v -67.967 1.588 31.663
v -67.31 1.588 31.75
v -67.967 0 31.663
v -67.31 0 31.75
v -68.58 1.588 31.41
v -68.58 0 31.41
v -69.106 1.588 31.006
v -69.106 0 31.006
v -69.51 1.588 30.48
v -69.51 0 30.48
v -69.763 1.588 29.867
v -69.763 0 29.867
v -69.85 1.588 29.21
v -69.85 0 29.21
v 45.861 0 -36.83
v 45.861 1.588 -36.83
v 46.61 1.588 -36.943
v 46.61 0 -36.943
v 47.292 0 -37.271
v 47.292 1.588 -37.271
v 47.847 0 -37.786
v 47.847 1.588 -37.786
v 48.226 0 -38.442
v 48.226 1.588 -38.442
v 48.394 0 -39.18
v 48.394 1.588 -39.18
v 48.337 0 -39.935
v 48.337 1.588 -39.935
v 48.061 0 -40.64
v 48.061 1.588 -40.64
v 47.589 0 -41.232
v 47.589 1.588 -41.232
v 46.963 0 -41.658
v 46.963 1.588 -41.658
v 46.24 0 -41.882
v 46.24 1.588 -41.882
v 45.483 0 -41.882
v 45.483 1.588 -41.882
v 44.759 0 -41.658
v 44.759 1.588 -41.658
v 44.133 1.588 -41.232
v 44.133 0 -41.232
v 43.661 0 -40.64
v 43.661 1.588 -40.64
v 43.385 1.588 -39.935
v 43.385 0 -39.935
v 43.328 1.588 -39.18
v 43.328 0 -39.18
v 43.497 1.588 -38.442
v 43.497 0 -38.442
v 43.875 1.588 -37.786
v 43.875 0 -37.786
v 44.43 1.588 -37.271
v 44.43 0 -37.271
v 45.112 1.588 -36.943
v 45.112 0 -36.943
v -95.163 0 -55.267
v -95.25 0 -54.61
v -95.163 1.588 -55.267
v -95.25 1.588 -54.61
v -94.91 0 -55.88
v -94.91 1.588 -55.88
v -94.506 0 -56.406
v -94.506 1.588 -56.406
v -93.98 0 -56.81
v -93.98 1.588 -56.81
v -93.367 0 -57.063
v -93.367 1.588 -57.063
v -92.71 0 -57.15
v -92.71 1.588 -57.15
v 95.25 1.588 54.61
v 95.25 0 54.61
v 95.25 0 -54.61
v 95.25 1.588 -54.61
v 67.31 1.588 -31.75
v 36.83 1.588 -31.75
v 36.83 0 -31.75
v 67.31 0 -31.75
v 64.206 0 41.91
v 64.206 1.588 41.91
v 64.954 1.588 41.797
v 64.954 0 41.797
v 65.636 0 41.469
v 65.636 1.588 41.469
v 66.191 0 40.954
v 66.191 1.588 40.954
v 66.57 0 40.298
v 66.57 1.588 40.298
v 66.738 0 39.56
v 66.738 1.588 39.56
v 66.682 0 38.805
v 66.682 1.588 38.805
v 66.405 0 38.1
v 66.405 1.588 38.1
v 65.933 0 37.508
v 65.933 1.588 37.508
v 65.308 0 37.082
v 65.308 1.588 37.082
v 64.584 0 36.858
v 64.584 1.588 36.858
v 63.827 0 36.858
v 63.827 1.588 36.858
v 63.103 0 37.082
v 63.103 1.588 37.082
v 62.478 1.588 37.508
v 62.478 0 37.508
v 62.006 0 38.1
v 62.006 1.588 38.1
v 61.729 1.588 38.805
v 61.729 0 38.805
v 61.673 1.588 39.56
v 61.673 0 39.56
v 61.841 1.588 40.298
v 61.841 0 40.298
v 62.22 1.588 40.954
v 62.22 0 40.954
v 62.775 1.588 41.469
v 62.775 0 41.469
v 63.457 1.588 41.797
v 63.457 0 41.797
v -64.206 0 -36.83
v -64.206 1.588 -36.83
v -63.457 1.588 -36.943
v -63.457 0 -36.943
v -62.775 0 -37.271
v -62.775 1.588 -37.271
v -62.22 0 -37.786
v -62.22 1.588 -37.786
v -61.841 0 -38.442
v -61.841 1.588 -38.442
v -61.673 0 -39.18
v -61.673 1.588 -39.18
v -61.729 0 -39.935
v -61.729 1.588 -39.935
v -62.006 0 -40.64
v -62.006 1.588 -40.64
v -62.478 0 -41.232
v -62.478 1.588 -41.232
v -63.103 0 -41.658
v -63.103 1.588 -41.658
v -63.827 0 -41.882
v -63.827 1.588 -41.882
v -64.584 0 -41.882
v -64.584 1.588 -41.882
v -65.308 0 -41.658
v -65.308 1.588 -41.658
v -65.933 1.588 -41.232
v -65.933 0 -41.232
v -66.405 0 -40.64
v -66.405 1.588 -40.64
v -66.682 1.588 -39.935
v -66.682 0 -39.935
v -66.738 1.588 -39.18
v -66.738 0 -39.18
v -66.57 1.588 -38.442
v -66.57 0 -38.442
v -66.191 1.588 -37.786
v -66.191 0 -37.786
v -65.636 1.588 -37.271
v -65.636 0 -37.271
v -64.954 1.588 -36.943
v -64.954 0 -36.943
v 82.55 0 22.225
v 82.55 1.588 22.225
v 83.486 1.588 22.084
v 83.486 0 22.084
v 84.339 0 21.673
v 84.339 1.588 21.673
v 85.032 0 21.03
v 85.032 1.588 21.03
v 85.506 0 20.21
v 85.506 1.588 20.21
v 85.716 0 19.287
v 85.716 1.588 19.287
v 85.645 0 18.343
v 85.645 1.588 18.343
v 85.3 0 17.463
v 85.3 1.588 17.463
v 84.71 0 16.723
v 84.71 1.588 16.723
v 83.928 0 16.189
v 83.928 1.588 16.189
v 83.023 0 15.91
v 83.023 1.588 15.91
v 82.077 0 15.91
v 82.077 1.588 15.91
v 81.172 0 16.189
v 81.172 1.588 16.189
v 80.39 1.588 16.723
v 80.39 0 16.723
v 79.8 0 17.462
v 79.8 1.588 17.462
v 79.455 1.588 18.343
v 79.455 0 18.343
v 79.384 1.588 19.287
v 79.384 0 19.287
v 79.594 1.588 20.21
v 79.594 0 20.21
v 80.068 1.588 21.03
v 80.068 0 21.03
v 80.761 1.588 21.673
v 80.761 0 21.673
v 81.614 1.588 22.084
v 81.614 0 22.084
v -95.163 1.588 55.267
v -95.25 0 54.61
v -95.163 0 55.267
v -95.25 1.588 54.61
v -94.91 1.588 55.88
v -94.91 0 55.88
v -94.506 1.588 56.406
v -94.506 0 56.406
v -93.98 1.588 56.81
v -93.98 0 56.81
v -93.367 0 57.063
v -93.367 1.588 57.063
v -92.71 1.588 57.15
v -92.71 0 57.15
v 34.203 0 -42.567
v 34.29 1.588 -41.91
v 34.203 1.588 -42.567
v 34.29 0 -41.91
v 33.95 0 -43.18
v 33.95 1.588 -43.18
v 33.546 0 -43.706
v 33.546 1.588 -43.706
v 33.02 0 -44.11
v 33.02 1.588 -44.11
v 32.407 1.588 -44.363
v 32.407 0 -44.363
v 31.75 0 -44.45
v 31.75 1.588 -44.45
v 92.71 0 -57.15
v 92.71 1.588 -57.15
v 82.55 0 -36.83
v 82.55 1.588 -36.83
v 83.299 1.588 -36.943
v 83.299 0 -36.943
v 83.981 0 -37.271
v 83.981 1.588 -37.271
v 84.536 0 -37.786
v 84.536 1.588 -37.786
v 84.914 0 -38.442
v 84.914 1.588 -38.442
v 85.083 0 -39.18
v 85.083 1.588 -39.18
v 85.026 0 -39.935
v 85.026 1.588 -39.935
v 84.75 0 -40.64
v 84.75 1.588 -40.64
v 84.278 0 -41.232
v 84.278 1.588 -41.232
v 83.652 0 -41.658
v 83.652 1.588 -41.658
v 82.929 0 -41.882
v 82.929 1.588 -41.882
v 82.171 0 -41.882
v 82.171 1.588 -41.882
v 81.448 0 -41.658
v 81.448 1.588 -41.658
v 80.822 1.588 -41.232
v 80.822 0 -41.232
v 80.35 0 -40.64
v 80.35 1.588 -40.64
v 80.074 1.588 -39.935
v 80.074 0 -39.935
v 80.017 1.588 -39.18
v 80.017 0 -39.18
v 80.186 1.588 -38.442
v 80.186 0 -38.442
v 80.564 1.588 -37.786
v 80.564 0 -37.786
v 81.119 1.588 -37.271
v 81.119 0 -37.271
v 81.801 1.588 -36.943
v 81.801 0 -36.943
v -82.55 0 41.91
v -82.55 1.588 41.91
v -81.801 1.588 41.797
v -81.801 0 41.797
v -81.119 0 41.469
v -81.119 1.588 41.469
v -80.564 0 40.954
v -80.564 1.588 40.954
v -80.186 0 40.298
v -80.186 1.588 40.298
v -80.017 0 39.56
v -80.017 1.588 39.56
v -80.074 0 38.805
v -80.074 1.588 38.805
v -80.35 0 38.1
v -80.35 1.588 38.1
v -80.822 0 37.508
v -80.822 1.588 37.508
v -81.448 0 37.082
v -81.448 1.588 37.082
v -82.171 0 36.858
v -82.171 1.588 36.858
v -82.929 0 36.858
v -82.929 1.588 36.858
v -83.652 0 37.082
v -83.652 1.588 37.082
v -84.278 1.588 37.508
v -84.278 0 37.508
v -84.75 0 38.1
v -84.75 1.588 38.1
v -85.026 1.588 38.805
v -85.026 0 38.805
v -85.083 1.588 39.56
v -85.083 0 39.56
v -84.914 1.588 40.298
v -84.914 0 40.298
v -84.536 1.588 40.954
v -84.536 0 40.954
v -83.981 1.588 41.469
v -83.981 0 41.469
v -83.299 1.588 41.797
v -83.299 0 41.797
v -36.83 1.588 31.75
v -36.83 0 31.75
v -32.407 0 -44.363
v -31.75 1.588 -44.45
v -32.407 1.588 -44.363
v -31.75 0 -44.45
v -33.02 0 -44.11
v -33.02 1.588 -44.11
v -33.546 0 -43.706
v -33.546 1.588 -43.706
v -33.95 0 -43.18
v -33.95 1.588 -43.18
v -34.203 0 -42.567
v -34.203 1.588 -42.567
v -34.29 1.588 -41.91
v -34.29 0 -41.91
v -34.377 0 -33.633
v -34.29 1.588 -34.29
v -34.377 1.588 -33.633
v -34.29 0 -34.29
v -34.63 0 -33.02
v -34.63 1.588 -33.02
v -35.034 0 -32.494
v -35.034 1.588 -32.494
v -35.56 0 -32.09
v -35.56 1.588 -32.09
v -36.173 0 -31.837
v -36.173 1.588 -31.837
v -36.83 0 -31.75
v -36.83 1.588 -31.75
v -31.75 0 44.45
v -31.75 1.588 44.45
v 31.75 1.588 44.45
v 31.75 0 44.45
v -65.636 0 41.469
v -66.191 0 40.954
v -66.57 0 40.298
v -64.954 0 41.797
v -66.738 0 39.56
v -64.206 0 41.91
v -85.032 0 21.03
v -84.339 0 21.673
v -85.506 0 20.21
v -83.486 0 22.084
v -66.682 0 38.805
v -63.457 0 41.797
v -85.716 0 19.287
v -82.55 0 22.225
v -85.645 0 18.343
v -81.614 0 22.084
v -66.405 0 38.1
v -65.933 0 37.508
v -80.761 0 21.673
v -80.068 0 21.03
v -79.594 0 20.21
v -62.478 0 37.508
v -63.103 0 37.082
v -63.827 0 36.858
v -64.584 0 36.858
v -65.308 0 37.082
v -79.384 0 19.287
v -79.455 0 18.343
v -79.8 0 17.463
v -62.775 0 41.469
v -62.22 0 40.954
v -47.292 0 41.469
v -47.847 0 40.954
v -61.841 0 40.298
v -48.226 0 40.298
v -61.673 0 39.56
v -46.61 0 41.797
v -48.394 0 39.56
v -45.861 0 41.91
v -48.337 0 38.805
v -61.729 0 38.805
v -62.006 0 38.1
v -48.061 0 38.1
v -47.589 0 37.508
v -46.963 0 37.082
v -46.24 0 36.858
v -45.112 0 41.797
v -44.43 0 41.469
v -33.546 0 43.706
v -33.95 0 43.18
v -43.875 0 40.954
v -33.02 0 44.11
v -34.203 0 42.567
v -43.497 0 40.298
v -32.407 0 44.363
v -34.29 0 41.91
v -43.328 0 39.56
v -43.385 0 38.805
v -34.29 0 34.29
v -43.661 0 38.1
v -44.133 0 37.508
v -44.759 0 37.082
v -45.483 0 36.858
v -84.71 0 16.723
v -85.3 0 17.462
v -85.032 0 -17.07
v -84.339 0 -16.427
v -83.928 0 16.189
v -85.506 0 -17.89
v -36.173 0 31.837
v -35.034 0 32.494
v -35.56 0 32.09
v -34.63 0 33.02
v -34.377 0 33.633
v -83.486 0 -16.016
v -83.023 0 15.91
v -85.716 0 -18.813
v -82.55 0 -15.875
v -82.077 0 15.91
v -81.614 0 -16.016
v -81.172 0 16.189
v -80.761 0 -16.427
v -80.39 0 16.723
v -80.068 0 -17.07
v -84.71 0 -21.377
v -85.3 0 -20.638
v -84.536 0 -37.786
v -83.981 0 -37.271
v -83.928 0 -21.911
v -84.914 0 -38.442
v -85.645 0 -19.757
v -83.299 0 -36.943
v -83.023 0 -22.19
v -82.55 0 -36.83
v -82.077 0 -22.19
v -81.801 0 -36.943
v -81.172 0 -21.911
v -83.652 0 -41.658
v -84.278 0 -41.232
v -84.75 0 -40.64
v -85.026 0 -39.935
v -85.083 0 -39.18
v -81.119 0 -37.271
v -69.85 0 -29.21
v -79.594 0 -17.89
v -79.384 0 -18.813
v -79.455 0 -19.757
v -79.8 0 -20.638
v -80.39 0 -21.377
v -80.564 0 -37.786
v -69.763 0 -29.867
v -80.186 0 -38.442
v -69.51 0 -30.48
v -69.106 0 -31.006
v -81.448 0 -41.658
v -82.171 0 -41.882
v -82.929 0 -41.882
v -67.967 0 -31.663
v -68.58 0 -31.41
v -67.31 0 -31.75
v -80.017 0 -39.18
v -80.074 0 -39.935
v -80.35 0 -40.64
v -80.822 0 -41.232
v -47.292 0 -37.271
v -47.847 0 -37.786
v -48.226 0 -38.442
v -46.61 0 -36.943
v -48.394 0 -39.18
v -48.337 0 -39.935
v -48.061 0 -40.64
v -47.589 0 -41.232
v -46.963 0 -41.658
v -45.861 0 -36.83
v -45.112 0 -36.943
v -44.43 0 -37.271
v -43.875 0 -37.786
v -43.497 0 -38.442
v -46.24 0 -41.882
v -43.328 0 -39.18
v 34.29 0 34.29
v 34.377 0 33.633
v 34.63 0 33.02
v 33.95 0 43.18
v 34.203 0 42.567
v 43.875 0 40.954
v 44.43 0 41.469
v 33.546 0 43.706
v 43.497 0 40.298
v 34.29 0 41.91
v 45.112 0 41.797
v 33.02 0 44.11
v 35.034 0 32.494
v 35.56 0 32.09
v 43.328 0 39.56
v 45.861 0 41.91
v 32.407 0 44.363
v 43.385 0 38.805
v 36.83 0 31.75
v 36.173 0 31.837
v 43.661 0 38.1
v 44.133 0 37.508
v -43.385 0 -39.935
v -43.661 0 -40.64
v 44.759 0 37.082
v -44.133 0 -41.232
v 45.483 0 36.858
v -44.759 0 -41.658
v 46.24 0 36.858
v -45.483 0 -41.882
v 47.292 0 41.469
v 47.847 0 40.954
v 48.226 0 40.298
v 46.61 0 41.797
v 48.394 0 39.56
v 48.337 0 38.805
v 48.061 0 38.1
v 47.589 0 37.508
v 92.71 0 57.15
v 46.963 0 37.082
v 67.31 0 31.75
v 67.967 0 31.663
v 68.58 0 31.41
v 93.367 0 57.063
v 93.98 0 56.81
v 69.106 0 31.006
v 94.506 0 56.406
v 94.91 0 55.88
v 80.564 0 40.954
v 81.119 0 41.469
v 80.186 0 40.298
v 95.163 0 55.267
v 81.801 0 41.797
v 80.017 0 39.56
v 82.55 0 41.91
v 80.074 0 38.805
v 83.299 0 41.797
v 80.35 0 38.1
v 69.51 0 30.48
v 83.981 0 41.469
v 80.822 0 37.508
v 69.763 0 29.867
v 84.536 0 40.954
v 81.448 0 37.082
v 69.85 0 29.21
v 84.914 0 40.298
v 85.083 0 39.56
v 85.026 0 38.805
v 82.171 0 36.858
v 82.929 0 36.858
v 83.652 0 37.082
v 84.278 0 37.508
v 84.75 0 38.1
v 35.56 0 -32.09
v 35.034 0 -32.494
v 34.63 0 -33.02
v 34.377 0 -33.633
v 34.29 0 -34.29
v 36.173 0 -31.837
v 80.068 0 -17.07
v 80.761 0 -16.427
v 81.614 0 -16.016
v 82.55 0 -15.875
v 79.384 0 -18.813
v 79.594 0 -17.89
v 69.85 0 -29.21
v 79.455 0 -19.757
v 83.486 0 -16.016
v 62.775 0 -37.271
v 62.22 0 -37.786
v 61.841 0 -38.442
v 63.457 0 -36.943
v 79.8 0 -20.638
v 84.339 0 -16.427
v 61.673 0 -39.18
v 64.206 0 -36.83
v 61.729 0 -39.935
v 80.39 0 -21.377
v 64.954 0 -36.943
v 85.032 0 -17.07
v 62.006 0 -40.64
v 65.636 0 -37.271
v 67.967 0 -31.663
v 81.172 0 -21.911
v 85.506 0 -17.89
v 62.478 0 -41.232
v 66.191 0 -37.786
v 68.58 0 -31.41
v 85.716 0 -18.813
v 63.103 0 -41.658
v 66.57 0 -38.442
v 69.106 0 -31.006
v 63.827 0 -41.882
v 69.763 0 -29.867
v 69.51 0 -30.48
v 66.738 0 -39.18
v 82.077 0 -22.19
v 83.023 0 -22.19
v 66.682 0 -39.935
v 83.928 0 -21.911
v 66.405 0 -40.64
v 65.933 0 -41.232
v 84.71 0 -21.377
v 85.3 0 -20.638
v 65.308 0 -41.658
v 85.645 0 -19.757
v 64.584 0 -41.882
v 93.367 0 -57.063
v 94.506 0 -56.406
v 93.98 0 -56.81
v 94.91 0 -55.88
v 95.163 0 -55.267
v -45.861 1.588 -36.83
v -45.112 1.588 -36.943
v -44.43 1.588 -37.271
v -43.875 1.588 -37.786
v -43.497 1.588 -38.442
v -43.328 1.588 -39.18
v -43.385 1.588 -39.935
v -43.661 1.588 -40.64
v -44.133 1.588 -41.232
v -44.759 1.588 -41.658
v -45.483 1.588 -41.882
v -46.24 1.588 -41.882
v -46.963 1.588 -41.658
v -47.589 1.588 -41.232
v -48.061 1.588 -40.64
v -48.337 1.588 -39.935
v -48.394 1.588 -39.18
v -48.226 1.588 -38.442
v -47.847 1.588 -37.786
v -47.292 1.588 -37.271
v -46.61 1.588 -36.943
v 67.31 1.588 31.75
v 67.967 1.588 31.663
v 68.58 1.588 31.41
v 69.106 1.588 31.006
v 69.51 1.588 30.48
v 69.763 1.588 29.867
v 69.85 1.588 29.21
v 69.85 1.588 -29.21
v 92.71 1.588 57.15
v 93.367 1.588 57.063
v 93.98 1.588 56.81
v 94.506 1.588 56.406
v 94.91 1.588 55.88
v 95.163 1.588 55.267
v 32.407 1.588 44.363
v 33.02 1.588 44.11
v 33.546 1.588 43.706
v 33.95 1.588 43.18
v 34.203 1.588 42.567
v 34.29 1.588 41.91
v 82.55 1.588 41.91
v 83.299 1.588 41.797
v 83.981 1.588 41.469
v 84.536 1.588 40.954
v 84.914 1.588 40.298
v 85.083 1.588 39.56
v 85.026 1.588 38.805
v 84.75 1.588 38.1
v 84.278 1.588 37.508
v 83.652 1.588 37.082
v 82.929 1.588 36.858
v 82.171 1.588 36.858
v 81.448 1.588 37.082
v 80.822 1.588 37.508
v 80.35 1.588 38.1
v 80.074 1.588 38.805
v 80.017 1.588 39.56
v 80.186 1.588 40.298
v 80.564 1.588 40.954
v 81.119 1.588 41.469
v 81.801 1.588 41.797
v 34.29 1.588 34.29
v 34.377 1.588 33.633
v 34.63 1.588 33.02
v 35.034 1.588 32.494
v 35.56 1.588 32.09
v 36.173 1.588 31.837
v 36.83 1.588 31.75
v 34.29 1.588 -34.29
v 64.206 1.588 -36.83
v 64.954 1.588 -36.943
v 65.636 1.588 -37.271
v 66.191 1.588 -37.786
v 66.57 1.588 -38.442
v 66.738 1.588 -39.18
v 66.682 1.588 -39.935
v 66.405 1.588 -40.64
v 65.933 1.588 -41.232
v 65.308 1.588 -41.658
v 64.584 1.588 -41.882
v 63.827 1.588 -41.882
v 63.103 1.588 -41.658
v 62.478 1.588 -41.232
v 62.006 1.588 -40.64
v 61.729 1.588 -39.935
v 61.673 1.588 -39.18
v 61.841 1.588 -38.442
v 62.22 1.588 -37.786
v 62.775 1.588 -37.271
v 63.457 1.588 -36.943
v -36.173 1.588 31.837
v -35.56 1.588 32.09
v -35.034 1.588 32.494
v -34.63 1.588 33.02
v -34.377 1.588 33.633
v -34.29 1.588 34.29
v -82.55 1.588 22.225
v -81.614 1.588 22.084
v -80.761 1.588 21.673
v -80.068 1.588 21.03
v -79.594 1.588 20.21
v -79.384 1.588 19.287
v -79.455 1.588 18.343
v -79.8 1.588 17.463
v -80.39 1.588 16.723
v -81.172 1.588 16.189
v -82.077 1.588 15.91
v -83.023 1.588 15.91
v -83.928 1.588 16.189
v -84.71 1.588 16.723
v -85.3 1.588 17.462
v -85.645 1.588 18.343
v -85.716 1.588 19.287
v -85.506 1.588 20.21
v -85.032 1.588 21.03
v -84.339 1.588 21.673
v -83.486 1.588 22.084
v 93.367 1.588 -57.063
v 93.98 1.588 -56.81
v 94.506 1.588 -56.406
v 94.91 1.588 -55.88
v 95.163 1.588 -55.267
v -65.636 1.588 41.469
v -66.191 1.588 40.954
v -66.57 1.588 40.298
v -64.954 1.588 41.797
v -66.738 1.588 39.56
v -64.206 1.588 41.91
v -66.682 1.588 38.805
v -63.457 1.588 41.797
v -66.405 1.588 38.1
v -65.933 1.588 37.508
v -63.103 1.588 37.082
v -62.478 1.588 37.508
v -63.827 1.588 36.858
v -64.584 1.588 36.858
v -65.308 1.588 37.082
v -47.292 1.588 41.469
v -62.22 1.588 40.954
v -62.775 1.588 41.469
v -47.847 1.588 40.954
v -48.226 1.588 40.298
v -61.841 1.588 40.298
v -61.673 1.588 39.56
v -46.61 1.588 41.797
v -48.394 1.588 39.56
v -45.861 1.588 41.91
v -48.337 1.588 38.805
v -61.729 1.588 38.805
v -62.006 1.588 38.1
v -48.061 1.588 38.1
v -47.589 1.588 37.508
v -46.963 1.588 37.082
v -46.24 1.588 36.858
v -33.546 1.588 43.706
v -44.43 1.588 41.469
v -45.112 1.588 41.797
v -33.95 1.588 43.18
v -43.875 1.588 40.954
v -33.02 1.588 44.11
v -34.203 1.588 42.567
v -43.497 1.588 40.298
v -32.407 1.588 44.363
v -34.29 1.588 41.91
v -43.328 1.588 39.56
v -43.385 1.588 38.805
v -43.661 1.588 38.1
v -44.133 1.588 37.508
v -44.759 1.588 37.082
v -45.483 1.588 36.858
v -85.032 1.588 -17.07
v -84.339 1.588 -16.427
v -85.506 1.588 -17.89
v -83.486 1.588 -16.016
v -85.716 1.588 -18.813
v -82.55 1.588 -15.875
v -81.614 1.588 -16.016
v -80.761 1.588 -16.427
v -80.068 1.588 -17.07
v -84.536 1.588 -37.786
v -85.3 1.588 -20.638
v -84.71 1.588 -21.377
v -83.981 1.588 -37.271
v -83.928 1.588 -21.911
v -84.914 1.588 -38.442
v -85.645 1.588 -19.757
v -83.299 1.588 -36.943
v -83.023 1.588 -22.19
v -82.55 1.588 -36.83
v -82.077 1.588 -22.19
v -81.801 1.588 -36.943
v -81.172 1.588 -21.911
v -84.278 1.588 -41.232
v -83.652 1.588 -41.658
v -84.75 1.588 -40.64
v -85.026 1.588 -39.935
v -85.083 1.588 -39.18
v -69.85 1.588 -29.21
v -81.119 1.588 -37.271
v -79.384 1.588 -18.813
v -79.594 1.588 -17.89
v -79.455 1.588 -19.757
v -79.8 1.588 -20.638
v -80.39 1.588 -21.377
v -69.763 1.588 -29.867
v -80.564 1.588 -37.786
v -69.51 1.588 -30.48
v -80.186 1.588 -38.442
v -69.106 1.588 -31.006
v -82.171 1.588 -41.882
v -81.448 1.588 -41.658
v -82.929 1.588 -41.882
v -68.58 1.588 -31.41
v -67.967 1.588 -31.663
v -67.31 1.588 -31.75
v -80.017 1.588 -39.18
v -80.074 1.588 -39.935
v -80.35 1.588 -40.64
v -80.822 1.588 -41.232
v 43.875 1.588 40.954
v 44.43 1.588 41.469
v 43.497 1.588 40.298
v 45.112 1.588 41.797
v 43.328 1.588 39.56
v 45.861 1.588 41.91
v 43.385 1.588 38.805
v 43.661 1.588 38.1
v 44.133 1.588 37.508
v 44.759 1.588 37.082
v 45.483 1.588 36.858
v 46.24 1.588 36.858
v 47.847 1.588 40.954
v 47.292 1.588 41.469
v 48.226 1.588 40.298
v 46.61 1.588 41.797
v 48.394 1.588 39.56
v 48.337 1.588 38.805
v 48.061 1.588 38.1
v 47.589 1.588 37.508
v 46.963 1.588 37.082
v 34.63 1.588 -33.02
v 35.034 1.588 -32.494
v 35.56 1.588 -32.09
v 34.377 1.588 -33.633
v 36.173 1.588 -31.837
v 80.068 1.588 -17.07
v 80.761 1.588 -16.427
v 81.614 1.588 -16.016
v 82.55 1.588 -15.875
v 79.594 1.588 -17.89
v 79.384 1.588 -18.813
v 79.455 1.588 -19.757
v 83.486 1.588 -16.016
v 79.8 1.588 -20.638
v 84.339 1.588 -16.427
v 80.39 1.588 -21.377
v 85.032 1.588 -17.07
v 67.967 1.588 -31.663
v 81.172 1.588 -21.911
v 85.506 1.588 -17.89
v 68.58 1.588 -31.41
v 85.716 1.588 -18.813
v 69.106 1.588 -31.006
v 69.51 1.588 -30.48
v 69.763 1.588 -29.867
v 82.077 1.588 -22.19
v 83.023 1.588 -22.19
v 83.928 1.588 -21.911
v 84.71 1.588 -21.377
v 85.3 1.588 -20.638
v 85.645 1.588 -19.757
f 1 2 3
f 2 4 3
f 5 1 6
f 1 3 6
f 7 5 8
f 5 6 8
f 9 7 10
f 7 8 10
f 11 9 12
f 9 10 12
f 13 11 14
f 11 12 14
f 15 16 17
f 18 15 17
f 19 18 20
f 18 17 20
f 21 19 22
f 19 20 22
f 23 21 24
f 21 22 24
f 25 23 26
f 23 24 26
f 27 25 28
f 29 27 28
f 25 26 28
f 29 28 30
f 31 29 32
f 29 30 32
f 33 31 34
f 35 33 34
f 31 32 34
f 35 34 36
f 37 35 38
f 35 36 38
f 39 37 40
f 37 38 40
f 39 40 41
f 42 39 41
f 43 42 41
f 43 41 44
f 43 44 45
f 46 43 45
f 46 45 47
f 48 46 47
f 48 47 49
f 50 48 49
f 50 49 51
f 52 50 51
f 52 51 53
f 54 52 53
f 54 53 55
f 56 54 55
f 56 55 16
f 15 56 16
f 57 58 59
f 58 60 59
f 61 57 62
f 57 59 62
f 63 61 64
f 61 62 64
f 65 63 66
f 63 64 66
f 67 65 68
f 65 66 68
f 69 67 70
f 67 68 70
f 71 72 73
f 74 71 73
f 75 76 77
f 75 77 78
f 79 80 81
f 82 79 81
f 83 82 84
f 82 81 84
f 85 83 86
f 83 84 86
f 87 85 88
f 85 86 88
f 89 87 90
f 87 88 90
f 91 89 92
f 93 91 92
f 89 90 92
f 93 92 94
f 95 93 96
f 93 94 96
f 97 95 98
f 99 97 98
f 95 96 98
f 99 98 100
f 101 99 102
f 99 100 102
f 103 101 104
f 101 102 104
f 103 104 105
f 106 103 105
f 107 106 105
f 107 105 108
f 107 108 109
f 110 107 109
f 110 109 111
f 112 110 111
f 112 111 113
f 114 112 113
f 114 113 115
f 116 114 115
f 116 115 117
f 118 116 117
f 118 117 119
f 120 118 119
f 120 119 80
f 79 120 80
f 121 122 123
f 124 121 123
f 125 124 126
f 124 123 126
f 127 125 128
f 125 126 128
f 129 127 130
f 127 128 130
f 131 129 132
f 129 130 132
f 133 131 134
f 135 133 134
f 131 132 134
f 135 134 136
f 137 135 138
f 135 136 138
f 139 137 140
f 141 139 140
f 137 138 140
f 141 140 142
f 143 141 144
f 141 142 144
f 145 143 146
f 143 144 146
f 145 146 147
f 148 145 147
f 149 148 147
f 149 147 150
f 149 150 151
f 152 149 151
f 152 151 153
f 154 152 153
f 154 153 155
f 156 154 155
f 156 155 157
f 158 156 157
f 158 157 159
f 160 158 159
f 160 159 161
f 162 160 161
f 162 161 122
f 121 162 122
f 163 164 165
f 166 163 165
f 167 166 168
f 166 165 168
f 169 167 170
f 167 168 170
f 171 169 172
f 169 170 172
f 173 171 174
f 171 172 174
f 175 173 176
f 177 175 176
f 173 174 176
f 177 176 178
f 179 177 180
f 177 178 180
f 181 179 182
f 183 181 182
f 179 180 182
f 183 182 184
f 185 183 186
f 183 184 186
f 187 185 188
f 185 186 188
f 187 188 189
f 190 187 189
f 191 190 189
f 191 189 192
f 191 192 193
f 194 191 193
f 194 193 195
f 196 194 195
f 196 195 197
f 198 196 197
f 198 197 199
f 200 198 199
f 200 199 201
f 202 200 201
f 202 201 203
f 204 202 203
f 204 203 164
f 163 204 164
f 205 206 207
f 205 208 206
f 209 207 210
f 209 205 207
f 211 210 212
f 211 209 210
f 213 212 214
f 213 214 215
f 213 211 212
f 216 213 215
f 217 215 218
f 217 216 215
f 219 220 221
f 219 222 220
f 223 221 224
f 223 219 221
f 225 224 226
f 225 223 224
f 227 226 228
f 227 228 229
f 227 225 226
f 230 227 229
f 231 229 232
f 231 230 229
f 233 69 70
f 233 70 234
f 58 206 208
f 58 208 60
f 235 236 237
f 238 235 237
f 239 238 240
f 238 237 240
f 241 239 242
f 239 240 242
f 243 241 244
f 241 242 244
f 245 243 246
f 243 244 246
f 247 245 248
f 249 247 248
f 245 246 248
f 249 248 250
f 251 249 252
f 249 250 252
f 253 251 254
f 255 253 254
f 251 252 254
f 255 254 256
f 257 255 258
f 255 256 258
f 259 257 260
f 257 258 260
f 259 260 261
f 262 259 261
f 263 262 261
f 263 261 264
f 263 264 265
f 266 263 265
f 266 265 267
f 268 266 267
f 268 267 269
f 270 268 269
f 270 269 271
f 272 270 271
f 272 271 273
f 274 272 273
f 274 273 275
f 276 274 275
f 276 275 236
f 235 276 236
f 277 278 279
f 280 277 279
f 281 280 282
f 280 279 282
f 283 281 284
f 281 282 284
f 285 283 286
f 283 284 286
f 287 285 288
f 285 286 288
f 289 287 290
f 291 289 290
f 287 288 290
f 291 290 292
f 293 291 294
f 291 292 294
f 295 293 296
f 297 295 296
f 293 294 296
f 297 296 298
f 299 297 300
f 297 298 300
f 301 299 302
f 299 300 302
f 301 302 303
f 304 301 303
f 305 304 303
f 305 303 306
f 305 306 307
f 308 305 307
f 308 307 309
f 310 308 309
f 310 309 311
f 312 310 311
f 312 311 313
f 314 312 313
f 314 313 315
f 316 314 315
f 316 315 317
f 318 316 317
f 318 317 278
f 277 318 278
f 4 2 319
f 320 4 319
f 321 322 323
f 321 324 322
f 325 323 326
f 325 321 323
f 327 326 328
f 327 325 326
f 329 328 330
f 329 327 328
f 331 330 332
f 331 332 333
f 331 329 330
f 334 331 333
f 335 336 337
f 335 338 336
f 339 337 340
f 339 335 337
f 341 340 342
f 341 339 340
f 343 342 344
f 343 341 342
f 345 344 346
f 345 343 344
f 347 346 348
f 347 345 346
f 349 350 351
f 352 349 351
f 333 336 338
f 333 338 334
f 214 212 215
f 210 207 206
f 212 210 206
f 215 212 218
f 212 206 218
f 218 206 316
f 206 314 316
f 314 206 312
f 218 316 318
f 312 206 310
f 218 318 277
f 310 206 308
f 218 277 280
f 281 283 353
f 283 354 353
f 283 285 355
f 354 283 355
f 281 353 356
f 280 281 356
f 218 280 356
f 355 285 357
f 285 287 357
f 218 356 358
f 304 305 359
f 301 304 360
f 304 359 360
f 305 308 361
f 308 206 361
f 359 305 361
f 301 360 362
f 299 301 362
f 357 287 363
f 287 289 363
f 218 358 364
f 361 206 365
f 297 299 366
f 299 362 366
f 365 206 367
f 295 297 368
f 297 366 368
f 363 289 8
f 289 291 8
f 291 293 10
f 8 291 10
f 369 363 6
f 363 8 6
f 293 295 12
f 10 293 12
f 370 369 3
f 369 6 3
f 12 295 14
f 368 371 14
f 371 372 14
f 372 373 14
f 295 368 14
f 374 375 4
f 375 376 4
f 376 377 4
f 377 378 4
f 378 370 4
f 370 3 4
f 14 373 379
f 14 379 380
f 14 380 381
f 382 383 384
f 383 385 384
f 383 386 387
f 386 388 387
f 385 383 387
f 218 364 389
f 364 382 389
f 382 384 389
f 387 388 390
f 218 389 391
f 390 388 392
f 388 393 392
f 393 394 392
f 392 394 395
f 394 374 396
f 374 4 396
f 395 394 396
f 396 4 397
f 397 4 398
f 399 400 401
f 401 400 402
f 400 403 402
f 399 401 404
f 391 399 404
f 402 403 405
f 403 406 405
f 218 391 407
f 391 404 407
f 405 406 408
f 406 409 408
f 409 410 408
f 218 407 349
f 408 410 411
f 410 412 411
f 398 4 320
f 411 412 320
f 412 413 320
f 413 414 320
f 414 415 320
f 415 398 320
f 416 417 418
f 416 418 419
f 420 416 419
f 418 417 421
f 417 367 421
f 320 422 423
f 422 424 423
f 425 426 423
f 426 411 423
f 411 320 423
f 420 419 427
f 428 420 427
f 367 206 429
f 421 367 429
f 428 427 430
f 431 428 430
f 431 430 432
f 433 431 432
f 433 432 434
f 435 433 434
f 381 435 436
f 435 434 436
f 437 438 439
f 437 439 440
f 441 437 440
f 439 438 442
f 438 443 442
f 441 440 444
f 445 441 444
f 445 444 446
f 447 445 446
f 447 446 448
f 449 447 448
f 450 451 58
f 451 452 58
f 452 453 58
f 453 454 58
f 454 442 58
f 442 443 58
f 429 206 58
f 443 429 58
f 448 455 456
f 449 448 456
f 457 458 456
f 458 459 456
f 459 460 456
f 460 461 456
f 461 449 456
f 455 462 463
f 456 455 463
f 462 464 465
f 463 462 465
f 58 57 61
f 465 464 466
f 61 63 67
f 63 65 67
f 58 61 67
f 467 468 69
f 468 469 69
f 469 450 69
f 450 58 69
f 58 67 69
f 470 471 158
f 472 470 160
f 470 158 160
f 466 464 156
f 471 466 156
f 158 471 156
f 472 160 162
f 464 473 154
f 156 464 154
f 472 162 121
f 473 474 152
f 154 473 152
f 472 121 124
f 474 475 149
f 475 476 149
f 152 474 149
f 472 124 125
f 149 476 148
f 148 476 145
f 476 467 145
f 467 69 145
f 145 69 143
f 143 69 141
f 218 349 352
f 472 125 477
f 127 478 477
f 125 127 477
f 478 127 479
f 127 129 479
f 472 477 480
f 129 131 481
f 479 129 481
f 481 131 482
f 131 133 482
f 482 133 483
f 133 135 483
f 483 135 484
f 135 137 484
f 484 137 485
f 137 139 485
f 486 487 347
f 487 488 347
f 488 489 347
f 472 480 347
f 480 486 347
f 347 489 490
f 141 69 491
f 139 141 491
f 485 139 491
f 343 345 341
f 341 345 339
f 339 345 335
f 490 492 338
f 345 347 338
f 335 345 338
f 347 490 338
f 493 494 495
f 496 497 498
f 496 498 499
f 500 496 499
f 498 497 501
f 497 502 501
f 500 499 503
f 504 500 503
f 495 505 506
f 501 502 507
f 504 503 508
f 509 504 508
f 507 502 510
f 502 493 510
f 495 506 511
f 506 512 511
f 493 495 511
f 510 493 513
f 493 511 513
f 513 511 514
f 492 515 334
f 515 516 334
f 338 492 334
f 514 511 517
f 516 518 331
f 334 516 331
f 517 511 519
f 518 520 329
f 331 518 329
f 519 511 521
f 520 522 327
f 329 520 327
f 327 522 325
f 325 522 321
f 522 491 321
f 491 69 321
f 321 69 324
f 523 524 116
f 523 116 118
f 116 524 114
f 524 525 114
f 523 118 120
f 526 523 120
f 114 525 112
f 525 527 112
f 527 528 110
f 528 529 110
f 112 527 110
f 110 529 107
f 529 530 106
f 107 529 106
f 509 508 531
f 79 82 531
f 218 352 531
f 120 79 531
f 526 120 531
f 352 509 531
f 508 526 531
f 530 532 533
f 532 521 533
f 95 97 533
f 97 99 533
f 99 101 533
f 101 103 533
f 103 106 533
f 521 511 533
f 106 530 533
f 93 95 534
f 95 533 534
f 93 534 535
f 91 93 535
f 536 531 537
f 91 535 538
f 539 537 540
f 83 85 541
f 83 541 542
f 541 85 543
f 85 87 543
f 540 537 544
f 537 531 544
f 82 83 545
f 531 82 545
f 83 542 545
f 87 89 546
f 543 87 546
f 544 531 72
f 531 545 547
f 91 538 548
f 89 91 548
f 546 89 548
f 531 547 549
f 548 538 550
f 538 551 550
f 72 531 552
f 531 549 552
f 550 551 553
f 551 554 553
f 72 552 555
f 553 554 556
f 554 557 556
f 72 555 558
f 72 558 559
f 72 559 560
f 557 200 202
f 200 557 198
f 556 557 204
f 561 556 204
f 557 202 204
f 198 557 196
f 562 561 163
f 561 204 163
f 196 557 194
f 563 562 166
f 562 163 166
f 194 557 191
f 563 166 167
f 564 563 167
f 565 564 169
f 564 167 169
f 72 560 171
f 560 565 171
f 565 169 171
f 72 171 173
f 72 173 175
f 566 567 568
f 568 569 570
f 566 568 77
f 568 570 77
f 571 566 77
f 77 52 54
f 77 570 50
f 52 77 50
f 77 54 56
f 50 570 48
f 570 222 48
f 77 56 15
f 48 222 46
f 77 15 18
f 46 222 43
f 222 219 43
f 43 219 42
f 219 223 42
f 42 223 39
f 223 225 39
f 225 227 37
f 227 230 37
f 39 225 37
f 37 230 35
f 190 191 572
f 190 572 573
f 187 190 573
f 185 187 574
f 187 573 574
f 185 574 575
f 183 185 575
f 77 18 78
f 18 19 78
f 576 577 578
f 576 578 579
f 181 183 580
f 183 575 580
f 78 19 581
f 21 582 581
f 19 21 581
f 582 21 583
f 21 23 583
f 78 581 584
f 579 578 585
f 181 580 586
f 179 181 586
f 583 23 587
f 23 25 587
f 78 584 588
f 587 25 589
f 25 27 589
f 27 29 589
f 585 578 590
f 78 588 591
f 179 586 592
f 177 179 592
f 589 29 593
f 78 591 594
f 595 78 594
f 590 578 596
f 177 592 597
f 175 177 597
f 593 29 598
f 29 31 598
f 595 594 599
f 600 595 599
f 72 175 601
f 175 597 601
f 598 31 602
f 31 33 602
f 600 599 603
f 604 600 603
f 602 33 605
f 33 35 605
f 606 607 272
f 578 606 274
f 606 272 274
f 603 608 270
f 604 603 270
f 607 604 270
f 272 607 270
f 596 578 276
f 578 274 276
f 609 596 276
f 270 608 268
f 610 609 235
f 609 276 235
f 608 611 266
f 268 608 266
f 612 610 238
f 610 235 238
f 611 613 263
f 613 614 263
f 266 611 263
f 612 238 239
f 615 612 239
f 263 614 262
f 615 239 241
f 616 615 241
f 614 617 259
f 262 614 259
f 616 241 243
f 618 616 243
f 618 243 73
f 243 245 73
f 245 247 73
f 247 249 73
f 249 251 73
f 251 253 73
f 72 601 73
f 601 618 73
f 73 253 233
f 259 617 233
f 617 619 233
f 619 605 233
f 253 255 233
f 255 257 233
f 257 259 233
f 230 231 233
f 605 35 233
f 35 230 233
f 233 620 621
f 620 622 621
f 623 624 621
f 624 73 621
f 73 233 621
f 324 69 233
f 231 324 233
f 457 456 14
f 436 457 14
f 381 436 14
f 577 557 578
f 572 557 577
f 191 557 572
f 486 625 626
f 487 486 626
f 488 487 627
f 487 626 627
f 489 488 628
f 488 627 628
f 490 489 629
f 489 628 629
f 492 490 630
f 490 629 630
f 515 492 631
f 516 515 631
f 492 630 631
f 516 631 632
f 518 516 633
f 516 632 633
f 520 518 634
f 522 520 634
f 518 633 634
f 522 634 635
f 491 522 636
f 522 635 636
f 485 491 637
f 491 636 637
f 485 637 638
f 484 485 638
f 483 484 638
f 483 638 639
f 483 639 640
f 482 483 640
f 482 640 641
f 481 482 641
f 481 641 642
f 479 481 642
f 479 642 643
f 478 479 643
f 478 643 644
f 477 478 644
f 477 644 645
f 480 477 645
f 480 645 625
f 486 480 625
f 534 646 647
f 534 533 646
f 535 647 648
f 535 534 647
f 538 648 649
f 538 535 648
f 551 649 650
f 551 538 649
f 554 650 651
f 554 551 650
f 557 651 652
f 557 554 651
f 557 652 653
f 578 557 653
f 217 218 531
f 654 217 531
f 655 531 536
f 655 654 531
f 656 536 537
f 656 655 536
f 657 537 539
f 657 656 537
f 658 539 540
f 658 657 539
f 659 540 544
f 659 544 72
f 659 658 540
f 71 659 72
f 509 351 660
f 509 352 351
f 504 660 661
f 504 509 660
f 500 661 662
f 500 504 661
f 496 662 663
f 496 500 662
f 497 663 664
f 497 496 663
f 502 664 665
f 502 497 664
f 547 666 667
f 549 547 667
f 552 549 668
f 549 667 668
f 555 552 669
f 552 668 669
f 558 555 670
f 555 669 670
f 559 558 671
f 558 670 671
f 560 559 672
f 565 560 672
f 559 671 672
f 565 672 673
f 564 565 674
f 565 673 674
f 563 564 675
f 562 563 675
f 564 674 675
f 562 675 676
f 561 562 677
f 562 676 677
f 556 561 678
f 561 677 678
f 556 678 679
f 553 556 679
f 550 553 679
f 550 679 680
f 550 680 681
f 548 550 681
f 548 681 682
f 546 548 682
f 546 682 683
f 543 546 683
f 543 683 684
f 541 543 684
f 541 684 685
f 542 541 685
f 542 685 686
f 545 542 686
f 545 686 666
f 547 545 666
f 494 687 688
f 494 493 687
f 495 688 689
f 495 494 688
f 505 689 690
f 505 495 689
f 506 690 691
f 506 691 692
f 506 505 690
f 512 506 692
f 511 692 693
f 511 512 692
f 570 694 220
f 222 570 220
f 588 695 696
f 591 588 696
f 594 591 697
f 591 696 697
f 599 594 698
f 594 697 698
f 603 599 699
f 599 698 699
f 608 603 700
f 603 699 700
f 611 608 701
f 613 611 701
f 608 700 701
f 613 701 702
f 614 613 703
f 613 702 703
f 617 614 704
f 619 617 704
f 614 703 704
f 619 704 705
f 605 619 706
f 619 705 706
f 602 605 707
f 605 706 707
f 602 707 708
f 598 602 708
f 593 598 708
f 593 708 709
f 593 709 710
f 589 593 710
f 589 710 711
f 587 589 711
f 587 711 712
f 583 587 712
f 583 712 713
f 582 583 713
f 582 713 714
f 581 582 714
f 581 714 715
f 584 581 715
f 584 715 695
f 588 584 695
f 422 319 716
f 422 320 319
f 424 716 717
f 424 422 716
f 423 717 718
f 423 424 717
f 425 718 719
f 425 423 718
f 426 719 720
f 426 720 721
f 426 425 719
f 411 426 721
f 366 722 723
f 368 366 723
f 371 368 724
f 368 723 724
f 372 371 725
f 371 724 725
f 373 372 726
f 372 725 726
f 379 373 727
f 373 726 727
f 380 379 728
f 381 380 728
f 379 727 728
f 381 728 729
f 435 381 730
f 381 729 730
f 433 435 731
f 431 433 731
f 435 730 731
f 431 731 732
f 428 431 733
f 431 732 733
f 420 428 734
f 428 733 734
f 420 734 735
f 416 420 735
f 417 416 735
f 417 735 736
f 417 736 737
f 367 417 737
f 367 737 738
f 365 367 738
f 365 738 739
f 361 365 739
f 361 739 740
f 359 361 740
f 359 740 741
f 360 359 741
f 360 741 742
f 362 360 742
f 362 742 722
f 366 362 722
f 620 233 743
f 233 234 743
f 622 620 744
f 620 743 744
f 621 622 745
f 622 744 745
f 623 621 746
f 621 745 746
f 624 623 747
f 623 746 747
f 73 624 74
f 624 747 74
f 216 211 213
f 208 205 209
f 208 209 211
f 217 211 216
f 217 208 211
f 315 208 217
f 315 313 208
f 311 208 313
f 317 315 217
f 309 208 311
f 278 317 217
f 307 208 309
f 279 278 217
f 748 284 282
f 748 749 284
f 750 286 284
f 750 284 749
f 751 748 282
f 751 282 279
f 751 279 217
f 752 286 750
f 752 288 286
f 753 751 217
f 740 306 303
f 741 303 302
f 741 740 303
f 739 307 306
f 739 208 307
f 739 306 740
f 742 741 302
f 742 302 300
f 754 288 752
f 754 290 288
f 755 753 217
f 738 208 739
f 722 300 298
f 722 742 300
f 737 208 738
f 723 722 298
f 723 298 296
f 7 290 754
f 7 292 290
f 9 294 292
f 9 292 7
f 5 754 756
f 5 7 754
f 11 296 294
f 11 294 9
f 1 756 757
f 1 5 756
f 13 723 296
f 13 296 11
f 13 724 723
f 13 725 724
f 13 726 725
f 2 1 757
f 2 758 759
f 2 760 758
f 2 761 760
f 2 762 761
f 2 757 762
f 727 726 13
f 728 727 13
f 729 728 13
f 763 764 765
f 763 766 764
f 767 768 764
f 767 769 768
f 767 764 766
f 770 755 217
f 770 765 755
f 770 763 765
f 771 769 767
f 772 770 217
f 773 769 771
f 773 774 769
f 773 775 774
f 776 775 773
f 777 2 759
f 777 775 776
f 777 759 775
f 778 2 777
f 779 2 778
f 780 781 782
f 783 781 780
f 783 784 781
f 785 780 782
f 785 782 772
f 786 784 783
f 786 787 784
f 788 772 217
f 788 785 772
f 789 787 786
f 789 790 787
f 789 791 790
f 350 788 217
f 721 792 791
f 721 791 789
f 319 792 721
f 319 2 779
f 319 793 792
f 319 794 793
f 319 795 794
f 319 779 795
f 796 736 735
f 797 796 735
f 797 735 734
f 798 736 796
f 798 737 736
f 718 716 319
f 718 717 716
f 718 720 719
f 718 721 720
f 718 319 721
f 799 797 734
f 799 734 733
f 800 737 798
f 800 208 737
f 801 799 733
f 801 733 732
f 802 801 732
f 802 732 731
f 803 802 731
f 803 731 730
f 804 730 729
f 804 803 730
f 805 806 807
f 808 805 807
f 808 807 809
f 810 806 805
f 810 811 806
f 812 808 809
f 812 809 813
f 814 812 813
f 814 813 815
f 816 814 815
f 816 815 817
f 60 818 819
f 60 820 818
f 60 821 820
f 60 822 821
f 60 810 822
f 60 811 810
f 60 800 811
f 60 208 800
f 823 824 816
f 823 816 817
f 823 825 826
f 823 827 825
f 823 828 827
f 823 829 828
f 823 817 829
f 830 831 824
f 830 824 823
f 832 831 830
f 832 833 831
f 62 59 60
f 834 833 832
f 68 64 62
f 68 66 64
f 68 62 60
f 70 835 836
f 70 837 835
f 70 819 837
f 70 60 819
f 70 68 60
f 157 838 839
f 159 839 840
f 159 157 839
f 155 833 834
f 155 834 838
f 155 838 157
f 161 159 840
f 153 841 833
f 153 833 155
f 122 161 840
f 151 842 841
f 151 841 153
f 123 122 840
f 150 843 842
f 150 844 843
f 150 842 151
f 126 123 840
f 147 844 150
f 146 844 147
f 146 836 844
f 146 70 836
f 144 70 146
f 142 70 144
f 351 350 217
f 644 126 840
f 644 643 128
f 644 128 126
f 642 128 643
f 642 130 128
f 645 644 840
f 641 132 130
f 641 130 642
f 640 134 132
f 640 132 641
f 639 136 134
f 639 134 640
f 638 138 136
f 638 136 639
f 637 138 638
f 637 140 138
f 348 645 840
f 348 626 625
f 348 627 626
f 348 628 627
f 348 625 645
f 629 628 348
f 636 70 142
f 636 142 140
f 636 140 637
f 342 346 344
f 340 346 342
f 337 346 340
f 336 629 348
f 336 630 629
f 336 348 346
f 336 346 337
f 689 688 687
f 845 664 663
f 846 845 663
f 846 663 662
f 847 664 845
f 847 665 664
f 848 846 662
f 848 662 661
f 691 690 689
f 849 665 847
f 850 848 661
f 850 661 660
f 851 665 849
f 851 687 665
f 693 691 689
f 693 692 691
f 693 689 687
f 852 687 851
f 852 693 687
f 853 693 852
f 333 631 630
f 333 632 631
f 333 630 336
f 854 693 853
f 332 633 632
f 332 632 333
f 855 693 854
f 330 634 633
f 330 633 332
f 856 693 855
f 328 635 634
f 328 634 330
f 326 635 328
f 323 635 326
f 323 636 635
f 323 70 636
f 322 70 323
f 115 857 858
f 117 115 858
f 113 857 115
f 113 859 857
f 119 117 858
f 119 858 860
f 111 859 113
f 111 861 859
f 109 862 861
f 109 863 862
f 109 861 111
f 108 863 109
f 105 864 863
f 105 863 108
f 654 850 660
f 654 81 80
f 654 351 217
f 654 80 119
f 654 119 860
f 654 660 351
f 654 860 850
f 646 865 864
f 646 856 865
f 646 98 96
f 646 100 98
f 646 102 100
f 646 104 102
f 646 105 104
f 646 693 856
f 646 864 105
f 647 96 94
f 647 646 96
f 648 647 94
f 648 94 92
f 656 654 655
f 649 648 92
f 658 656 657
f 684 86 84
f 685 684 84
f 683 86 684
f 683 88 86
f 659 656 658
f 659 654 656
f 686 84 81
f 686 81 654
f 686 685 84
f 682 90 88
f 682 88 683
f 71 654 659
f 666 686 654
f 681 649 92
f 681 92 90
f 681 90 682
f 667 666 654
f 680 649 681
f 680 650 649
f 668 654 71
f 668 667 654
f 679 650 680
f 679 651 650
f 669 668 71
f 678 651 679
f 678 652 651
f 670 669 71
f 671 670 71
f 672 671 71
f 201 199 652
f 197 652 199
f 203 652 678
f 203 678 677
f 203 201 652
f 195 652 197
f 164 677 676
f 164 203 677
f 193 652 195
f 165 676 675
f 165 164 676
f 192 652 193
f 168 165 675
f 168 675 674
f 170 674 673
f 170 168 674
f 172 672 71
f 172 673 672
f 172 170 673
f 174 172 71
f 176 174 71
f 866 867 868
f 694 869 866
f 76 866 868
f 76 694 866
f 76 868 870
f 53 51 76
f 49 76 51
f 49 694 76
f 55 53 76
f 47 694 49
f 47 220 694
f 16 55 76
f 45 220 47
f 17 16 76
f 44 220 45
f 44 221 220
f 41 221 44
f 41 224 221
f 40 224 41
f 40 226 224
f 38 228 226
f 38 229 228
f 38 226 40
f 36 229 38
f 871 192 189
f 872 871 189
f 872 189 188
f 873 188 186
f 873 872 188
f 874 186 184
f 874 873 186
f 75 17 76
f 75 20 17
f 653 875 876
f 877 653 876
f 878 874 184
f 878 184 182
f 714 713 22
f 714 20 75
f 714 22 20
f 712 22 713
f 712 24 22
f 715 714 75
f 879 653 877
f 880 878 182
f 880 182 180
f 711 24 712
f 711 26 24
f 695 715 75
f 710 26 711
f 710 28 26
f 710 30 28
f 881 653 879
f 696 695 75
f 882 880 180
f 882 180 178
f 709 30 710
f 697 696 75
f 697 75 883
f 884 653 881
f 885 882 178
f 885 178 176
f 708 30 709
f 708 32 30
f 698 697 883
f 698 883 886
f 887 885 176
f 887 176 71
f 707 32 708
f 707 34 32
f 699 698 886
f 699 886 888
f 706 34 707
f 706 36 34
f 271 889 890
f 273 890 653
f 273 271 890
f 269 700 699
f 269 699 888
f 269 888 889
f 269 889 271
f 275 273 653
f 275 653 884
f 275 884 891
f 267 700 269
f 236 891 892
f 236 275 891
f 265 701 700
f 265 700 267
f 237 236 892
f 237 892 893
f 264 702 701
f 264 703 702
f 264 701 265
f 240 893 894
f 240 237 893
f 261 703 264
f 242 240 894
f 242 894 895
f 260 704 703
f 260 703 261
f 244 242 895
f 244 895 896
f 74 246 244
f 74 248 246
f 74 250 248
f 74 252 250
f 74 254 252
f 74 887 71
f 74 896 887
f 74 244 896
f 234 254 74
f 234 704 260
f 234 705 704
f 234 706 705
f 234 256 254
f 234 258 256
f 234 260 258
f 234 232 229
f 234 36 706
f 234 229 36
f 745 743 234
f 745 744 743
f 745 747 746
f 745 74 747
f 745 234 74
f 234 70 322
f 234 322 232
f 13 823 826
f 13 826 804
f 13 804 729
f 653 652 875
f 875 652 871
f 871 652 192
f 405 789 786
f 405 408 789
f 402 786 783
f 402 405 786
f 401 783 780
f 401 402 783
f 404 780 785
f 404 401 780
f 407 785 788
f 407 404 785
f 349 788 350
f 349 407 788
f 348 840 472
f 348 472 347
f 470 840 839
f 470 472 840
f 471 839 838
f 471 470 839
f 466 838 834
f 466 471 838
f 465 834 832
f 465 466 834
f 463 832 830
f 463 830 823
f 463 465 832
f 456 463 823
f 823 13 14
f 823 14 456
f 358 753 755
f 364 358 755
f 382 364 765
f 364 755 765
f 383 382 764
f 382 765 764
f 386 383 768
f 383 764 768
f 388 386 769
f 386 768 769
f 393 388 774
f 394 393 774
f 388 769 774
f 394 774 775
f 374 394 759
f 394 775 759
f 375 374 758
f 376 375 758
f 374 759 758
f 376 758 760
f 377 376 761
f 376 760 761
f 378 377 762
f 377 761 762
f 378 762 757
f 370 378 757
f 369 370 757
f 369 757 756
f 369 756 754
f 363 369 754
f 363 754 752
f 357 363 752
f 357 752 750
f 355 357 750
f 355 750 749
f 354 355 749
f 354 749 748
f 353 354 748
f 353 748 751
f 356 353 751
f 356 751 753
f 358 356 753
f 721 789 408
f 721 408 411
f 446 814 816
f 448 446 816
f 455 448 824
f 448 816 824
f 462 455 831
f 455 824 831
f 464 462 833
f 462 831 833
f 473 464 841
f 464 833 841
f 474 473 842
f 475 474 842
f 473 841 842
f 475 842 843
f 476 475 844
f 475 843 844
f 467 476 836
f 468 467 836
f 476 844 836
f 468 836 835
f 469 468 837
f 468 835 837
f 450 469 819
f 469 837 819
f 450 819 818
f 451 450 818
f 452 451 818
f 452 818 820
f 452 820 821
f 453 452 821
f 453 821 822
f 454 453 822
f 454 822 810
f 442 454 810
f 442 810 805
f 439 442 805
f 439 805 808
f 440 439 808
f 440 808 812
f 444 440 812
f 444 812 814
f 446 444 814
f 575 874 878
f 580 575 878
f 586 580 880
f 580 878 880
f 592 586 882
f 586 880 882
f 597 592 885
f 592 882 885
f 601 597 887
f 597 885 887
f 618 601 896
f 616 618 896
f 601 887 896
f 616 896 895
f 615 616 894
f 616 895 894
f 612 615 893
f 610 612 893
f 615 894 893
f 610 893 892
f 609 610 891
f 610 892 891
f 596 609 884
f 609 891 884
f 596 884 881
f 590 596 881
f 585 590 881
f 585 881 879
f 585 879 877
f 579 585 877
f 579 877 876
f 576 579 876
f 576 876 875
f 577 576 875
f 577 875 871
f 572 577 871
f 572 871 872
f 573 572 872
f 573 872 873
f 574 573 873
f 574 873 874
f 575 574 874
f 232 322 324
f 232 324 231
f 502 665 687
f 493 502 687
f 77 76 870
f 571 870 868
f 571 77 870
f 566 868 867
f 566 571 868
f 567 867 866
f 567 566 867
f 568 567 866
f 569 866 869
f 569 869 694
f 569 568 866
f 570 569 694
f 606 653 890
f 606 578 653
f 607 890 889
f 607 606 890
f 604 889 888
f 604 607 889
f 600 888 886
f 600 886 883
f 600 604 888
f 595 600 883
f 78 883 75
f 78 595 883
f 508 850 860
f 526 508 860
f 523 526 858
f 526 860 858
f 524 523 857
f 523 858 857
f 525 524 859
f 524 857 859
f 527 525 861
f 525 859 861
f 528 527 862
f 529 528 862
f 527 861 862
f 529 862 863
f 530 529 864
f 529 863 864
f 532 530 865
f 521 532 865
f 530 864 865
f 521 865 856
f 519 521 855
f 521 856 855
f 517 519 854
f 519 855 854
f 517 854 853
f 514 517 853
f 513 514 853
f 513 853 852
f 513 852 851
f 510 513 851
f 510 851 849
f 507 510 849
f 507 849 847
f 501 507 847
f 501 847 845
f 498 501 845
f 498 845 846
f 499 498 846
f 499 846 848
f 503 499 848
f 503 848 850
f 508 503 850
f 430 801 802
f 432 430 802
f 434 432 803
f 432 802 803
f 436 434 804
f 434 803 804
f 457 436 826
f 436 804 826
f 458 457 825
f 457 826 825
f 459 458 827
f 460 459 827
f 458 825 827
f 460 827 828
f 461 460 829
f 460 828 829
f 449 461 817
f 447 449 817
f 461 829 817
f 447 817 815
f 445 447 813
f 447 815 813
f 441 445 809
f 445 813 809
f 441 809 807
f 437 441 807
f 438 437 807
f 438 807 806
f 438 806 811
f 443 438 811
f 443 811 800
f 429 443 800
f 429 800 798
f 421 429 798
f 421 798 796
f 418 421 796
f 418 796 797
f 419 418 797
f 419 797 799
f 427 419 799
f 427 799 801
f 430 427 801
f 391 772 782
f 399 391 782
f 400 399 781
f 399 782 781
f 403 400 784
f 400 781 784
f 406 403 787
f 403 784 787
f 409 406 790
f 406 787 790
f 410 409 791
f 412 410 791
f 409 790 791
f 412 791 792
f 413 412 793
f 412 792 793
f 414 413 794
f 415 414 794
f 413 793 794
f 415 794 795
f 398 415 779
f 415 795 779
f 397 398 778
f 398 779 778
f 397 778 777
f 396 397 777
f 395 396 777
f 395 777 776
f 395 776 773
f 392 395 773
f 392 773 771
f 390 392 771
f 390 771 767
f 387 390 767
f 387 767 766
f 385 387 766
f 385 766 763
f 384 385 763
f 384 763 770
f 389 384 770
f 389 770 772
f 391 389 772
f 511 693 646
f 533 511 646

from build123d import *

# Parameters (mm, degrees)
SKETCH1_W           = 190.5
SKETCH1_H           = 114.3
BOSS_EXTRUDE1_DEPTH = 1.5875
SKETCH6_W           = 139.7
SKETCH6_H           = 63.5
CUT_EXTRUDE1_DEPTH  = 3.175
FILLET1_R           = 2.54
SKETCH7_R           = 3.175
CUT_EXTRUDE2_DEPTH  = 3.175
SKETCH8_R           = 2.54
CUT_EXTRUDE3_DEPTH  = 2.54
SKETCH9_R           = 2.54
CUT_EXTRUDE4_DEPTH  = 2.54
SKETCH10_W          = 68.58
SKETCH10_H          = 12.7
CUT_EXTRUDE5_DEPTH  = 112.090976934
FILLET2_R           = 2.54


with BuildPart() as part:
    # Sketch1 → Boss-Extrude1 (new body)
    with BuildSketch(Plane(origin=(0, 0, 0), x_dir=(1, 0, 0), z_dir=(0, 1, 0))):
        Rectangle(SKETCH1_W, SKETCH1_H)
    extrude(amount=BOSS_EXTRUDE1_DEPTH)

    # Sketch6 → Cut-Extrude1 (cut)
    with BuildSketch(Plane(origin=(0, 1.5875, 0), x_dir=(1, 0, 0), z_dir=(0, 1, 0))):
        Rectangle(SKETCH6_W, SKETCH6_H)
    extrude(amount=-CUT_EXTRUDE1_DEPTH, mode=Mode.SUBTRACT)

    # Fillet1
    fillet1_edges = [part.edges().sort_by_distance(p)[0] for p in [
        (-69.85, 0.79375, 31.75),
        (-69.85, 0.79375, -31.75),
        (69.85, 0.79375, -31.75),
        (69.85, 0.79375, 31.75),
        (95.25, 0.79375, -57.15),
        (95.25, 0.79375, 57.15),
        (-95.25, 0.79375, 57.15),
        (-95.25, 0.79375, -57.15),
    ]]
    fillet(fillet1_edges, radius=FILLET1_R)

    # Sketch7 → Cut-Extrude2 (cut)
    with BuildSketch(Plane(origin=(0, 1.5875, 0), x_dir=(1, 0, 0), z_dir=(0, 1, 0))):
        with Locations(Location((-82.55, 19.05, 0), (0, 0, 270))):
            Circle(SKETCH7_R)
        with Locations(Location((-82.55, -19.05, 0), (0, 0, 270))):
            Circle(SKETCH7_R)
        with Locations(Location((82.55, -19.05, 0), (0, 0, 270))):
            Circle(SKETCH7_R)
        with Locations(Location((82.55, 19.05, 0), (0, 0, 270))):
            Circle(SKETCH7_R)
    extrude(amount=-CUT_EXTRUDE2_DEPTH, mode=Mode.SUBTRACT)

    # Sketch8 → Cut-Extrude3 (cut)
    with BuildSketch(Plane(origin=(0, 1.5875, 0), x_dir=(1, 0, 0), z_dir=(0, 1, 0))):
        with Locations(Location((82.55, 39.37, 0), (0, 0, 270))):
            Circle(SKETCH8_R)
        with Locations(Location((64.205555556, 39.37, 0), (0, 0, 270))):
            Circle(SKETCH8_R)
        with Locations(Location((45.861111111, 39.37, 0), (0, 0, 270))):
            Circle(SKETCH8_R)
        with Locations(Location((27.516666667, 39.37, 0), (0, 0, 270))):
            Circle(SKETCH8_R)
        with Locations(Location((9.172222222, 39.37, 0), (0, 0, 270))):
            Circle(SKETCH8_R)
        with Locations(Location((-9.172222222, 39.37, 0), (0, 0, 270))):
            Circle(SKETCH8_R)
        with Locations(Location((-27.516666667, 39.37, 0), (0, 0, 270))):
            Circle(SKETCH8_R)
        with Locations(Location((-45.861111111, 39.37, 0), (0, 0, 270))):
            Circle(SKETCH8_R)
        with Locations(Location((-64.205555556, 39.37, 0), (0, 0, 270))):
            Circle(SKETCH8_R)
        with Locations(Location((-82.55, 39.37, 0), (0, 0, 270))):
            Circle(SKETCH8_R)
    extrude(amount=-CUT_EXTRUDE3_DEPTH, mode=Mode.SUBTRACT)

    # Sketch9 → Cut-Extrude4 (cut)
    with BuildSketch(Plane(origin=(0, 1.5875, 0), x_dir=(1, 0, 0), z_dir=(0, 1, 0))):
        with Locations(Location((82.55, -39.37, 0), (0, 0, 270))):
            Circle(SKETCH9_R)
        with Locations(Location((64.205555556, -39.37, 0), (0, 0, 270))):
            Circle(SKETCH9_R)
        with Locations(Location((45.861111111, -39.37, 0), (0, 0, 270))):
            Circle(SKETCH9_R)
        with Locations(Location((27.516666667, -39.37, 0), (0, 0, 270))):
            Circle(SKETCH9_R)
        with Locations(Location((9.172222222, -39.37, 0), (0, 0, 270))):
            Circle(SKETCH9_R)
        with Locations(Location((-9.172222222, -39.37, 0), (0, 0, 270))):
            Circle(SKETCH9_R)
        with Locations(Location((-27.516666667, -39.37, 0), (0, 0, 270))):
            Circle(SKETCH9_R)
        with Locations(Location((-45.861111111, -39.37, 0), (0, 0, 270))):
            Circle(SKETCH9_R)
        with Locations(Location((-64.205555556, -39.37, 0), (0, 0, 270))):
            Circle(SKETCH9_R)
        with Locations(Location((-82.55, -39.37, 0), (0, 0, 270))):
            Circle(SKETCH9_R)
    extrude(amount=-CUT_EXTRUDE4_DEPTH, mode=Mode.SUBTRACT)

    # Sketch10 → Cut-Extrude5 (cut, through all)
    with BuildSketch(Plane(origin=(0, 1.5875, 0), x_dir=(1, 0, 0), z_dir=(0, 1, 0))):
        with Locations((0, -38.1)):
            Rectangle(SKETCH10_W, SKETCH10_H)
        with Locations((0, 38.1)):
            Rectangle(SKETCH10_W, SKETCH10_H)
    extrude(amount=-CUT_EXTRUDE5_DEPTH, mode=Mode.SUBTRACT)

    # Fillet2
    fillet2_edges = [part.edges().sort_by_distance(p)[0] for p in [
        (-34.29, 0.79375, 44.45),
        (-34.29, 0.79375, 31.75),
        (34.29, 0.79375, 31.75),
        (34.29, 0.79375, 44.45),
        (-34.29, 0.79375, -31.75),
        (-34.29, 0.79375, -44.45),
        (34.29, 0.79375, -44.45),
        (34.29, 0.79375, -31.75),
    ]]
    fillet(fillet2_edges, radius=FILLET2_R)


solid = part.part
